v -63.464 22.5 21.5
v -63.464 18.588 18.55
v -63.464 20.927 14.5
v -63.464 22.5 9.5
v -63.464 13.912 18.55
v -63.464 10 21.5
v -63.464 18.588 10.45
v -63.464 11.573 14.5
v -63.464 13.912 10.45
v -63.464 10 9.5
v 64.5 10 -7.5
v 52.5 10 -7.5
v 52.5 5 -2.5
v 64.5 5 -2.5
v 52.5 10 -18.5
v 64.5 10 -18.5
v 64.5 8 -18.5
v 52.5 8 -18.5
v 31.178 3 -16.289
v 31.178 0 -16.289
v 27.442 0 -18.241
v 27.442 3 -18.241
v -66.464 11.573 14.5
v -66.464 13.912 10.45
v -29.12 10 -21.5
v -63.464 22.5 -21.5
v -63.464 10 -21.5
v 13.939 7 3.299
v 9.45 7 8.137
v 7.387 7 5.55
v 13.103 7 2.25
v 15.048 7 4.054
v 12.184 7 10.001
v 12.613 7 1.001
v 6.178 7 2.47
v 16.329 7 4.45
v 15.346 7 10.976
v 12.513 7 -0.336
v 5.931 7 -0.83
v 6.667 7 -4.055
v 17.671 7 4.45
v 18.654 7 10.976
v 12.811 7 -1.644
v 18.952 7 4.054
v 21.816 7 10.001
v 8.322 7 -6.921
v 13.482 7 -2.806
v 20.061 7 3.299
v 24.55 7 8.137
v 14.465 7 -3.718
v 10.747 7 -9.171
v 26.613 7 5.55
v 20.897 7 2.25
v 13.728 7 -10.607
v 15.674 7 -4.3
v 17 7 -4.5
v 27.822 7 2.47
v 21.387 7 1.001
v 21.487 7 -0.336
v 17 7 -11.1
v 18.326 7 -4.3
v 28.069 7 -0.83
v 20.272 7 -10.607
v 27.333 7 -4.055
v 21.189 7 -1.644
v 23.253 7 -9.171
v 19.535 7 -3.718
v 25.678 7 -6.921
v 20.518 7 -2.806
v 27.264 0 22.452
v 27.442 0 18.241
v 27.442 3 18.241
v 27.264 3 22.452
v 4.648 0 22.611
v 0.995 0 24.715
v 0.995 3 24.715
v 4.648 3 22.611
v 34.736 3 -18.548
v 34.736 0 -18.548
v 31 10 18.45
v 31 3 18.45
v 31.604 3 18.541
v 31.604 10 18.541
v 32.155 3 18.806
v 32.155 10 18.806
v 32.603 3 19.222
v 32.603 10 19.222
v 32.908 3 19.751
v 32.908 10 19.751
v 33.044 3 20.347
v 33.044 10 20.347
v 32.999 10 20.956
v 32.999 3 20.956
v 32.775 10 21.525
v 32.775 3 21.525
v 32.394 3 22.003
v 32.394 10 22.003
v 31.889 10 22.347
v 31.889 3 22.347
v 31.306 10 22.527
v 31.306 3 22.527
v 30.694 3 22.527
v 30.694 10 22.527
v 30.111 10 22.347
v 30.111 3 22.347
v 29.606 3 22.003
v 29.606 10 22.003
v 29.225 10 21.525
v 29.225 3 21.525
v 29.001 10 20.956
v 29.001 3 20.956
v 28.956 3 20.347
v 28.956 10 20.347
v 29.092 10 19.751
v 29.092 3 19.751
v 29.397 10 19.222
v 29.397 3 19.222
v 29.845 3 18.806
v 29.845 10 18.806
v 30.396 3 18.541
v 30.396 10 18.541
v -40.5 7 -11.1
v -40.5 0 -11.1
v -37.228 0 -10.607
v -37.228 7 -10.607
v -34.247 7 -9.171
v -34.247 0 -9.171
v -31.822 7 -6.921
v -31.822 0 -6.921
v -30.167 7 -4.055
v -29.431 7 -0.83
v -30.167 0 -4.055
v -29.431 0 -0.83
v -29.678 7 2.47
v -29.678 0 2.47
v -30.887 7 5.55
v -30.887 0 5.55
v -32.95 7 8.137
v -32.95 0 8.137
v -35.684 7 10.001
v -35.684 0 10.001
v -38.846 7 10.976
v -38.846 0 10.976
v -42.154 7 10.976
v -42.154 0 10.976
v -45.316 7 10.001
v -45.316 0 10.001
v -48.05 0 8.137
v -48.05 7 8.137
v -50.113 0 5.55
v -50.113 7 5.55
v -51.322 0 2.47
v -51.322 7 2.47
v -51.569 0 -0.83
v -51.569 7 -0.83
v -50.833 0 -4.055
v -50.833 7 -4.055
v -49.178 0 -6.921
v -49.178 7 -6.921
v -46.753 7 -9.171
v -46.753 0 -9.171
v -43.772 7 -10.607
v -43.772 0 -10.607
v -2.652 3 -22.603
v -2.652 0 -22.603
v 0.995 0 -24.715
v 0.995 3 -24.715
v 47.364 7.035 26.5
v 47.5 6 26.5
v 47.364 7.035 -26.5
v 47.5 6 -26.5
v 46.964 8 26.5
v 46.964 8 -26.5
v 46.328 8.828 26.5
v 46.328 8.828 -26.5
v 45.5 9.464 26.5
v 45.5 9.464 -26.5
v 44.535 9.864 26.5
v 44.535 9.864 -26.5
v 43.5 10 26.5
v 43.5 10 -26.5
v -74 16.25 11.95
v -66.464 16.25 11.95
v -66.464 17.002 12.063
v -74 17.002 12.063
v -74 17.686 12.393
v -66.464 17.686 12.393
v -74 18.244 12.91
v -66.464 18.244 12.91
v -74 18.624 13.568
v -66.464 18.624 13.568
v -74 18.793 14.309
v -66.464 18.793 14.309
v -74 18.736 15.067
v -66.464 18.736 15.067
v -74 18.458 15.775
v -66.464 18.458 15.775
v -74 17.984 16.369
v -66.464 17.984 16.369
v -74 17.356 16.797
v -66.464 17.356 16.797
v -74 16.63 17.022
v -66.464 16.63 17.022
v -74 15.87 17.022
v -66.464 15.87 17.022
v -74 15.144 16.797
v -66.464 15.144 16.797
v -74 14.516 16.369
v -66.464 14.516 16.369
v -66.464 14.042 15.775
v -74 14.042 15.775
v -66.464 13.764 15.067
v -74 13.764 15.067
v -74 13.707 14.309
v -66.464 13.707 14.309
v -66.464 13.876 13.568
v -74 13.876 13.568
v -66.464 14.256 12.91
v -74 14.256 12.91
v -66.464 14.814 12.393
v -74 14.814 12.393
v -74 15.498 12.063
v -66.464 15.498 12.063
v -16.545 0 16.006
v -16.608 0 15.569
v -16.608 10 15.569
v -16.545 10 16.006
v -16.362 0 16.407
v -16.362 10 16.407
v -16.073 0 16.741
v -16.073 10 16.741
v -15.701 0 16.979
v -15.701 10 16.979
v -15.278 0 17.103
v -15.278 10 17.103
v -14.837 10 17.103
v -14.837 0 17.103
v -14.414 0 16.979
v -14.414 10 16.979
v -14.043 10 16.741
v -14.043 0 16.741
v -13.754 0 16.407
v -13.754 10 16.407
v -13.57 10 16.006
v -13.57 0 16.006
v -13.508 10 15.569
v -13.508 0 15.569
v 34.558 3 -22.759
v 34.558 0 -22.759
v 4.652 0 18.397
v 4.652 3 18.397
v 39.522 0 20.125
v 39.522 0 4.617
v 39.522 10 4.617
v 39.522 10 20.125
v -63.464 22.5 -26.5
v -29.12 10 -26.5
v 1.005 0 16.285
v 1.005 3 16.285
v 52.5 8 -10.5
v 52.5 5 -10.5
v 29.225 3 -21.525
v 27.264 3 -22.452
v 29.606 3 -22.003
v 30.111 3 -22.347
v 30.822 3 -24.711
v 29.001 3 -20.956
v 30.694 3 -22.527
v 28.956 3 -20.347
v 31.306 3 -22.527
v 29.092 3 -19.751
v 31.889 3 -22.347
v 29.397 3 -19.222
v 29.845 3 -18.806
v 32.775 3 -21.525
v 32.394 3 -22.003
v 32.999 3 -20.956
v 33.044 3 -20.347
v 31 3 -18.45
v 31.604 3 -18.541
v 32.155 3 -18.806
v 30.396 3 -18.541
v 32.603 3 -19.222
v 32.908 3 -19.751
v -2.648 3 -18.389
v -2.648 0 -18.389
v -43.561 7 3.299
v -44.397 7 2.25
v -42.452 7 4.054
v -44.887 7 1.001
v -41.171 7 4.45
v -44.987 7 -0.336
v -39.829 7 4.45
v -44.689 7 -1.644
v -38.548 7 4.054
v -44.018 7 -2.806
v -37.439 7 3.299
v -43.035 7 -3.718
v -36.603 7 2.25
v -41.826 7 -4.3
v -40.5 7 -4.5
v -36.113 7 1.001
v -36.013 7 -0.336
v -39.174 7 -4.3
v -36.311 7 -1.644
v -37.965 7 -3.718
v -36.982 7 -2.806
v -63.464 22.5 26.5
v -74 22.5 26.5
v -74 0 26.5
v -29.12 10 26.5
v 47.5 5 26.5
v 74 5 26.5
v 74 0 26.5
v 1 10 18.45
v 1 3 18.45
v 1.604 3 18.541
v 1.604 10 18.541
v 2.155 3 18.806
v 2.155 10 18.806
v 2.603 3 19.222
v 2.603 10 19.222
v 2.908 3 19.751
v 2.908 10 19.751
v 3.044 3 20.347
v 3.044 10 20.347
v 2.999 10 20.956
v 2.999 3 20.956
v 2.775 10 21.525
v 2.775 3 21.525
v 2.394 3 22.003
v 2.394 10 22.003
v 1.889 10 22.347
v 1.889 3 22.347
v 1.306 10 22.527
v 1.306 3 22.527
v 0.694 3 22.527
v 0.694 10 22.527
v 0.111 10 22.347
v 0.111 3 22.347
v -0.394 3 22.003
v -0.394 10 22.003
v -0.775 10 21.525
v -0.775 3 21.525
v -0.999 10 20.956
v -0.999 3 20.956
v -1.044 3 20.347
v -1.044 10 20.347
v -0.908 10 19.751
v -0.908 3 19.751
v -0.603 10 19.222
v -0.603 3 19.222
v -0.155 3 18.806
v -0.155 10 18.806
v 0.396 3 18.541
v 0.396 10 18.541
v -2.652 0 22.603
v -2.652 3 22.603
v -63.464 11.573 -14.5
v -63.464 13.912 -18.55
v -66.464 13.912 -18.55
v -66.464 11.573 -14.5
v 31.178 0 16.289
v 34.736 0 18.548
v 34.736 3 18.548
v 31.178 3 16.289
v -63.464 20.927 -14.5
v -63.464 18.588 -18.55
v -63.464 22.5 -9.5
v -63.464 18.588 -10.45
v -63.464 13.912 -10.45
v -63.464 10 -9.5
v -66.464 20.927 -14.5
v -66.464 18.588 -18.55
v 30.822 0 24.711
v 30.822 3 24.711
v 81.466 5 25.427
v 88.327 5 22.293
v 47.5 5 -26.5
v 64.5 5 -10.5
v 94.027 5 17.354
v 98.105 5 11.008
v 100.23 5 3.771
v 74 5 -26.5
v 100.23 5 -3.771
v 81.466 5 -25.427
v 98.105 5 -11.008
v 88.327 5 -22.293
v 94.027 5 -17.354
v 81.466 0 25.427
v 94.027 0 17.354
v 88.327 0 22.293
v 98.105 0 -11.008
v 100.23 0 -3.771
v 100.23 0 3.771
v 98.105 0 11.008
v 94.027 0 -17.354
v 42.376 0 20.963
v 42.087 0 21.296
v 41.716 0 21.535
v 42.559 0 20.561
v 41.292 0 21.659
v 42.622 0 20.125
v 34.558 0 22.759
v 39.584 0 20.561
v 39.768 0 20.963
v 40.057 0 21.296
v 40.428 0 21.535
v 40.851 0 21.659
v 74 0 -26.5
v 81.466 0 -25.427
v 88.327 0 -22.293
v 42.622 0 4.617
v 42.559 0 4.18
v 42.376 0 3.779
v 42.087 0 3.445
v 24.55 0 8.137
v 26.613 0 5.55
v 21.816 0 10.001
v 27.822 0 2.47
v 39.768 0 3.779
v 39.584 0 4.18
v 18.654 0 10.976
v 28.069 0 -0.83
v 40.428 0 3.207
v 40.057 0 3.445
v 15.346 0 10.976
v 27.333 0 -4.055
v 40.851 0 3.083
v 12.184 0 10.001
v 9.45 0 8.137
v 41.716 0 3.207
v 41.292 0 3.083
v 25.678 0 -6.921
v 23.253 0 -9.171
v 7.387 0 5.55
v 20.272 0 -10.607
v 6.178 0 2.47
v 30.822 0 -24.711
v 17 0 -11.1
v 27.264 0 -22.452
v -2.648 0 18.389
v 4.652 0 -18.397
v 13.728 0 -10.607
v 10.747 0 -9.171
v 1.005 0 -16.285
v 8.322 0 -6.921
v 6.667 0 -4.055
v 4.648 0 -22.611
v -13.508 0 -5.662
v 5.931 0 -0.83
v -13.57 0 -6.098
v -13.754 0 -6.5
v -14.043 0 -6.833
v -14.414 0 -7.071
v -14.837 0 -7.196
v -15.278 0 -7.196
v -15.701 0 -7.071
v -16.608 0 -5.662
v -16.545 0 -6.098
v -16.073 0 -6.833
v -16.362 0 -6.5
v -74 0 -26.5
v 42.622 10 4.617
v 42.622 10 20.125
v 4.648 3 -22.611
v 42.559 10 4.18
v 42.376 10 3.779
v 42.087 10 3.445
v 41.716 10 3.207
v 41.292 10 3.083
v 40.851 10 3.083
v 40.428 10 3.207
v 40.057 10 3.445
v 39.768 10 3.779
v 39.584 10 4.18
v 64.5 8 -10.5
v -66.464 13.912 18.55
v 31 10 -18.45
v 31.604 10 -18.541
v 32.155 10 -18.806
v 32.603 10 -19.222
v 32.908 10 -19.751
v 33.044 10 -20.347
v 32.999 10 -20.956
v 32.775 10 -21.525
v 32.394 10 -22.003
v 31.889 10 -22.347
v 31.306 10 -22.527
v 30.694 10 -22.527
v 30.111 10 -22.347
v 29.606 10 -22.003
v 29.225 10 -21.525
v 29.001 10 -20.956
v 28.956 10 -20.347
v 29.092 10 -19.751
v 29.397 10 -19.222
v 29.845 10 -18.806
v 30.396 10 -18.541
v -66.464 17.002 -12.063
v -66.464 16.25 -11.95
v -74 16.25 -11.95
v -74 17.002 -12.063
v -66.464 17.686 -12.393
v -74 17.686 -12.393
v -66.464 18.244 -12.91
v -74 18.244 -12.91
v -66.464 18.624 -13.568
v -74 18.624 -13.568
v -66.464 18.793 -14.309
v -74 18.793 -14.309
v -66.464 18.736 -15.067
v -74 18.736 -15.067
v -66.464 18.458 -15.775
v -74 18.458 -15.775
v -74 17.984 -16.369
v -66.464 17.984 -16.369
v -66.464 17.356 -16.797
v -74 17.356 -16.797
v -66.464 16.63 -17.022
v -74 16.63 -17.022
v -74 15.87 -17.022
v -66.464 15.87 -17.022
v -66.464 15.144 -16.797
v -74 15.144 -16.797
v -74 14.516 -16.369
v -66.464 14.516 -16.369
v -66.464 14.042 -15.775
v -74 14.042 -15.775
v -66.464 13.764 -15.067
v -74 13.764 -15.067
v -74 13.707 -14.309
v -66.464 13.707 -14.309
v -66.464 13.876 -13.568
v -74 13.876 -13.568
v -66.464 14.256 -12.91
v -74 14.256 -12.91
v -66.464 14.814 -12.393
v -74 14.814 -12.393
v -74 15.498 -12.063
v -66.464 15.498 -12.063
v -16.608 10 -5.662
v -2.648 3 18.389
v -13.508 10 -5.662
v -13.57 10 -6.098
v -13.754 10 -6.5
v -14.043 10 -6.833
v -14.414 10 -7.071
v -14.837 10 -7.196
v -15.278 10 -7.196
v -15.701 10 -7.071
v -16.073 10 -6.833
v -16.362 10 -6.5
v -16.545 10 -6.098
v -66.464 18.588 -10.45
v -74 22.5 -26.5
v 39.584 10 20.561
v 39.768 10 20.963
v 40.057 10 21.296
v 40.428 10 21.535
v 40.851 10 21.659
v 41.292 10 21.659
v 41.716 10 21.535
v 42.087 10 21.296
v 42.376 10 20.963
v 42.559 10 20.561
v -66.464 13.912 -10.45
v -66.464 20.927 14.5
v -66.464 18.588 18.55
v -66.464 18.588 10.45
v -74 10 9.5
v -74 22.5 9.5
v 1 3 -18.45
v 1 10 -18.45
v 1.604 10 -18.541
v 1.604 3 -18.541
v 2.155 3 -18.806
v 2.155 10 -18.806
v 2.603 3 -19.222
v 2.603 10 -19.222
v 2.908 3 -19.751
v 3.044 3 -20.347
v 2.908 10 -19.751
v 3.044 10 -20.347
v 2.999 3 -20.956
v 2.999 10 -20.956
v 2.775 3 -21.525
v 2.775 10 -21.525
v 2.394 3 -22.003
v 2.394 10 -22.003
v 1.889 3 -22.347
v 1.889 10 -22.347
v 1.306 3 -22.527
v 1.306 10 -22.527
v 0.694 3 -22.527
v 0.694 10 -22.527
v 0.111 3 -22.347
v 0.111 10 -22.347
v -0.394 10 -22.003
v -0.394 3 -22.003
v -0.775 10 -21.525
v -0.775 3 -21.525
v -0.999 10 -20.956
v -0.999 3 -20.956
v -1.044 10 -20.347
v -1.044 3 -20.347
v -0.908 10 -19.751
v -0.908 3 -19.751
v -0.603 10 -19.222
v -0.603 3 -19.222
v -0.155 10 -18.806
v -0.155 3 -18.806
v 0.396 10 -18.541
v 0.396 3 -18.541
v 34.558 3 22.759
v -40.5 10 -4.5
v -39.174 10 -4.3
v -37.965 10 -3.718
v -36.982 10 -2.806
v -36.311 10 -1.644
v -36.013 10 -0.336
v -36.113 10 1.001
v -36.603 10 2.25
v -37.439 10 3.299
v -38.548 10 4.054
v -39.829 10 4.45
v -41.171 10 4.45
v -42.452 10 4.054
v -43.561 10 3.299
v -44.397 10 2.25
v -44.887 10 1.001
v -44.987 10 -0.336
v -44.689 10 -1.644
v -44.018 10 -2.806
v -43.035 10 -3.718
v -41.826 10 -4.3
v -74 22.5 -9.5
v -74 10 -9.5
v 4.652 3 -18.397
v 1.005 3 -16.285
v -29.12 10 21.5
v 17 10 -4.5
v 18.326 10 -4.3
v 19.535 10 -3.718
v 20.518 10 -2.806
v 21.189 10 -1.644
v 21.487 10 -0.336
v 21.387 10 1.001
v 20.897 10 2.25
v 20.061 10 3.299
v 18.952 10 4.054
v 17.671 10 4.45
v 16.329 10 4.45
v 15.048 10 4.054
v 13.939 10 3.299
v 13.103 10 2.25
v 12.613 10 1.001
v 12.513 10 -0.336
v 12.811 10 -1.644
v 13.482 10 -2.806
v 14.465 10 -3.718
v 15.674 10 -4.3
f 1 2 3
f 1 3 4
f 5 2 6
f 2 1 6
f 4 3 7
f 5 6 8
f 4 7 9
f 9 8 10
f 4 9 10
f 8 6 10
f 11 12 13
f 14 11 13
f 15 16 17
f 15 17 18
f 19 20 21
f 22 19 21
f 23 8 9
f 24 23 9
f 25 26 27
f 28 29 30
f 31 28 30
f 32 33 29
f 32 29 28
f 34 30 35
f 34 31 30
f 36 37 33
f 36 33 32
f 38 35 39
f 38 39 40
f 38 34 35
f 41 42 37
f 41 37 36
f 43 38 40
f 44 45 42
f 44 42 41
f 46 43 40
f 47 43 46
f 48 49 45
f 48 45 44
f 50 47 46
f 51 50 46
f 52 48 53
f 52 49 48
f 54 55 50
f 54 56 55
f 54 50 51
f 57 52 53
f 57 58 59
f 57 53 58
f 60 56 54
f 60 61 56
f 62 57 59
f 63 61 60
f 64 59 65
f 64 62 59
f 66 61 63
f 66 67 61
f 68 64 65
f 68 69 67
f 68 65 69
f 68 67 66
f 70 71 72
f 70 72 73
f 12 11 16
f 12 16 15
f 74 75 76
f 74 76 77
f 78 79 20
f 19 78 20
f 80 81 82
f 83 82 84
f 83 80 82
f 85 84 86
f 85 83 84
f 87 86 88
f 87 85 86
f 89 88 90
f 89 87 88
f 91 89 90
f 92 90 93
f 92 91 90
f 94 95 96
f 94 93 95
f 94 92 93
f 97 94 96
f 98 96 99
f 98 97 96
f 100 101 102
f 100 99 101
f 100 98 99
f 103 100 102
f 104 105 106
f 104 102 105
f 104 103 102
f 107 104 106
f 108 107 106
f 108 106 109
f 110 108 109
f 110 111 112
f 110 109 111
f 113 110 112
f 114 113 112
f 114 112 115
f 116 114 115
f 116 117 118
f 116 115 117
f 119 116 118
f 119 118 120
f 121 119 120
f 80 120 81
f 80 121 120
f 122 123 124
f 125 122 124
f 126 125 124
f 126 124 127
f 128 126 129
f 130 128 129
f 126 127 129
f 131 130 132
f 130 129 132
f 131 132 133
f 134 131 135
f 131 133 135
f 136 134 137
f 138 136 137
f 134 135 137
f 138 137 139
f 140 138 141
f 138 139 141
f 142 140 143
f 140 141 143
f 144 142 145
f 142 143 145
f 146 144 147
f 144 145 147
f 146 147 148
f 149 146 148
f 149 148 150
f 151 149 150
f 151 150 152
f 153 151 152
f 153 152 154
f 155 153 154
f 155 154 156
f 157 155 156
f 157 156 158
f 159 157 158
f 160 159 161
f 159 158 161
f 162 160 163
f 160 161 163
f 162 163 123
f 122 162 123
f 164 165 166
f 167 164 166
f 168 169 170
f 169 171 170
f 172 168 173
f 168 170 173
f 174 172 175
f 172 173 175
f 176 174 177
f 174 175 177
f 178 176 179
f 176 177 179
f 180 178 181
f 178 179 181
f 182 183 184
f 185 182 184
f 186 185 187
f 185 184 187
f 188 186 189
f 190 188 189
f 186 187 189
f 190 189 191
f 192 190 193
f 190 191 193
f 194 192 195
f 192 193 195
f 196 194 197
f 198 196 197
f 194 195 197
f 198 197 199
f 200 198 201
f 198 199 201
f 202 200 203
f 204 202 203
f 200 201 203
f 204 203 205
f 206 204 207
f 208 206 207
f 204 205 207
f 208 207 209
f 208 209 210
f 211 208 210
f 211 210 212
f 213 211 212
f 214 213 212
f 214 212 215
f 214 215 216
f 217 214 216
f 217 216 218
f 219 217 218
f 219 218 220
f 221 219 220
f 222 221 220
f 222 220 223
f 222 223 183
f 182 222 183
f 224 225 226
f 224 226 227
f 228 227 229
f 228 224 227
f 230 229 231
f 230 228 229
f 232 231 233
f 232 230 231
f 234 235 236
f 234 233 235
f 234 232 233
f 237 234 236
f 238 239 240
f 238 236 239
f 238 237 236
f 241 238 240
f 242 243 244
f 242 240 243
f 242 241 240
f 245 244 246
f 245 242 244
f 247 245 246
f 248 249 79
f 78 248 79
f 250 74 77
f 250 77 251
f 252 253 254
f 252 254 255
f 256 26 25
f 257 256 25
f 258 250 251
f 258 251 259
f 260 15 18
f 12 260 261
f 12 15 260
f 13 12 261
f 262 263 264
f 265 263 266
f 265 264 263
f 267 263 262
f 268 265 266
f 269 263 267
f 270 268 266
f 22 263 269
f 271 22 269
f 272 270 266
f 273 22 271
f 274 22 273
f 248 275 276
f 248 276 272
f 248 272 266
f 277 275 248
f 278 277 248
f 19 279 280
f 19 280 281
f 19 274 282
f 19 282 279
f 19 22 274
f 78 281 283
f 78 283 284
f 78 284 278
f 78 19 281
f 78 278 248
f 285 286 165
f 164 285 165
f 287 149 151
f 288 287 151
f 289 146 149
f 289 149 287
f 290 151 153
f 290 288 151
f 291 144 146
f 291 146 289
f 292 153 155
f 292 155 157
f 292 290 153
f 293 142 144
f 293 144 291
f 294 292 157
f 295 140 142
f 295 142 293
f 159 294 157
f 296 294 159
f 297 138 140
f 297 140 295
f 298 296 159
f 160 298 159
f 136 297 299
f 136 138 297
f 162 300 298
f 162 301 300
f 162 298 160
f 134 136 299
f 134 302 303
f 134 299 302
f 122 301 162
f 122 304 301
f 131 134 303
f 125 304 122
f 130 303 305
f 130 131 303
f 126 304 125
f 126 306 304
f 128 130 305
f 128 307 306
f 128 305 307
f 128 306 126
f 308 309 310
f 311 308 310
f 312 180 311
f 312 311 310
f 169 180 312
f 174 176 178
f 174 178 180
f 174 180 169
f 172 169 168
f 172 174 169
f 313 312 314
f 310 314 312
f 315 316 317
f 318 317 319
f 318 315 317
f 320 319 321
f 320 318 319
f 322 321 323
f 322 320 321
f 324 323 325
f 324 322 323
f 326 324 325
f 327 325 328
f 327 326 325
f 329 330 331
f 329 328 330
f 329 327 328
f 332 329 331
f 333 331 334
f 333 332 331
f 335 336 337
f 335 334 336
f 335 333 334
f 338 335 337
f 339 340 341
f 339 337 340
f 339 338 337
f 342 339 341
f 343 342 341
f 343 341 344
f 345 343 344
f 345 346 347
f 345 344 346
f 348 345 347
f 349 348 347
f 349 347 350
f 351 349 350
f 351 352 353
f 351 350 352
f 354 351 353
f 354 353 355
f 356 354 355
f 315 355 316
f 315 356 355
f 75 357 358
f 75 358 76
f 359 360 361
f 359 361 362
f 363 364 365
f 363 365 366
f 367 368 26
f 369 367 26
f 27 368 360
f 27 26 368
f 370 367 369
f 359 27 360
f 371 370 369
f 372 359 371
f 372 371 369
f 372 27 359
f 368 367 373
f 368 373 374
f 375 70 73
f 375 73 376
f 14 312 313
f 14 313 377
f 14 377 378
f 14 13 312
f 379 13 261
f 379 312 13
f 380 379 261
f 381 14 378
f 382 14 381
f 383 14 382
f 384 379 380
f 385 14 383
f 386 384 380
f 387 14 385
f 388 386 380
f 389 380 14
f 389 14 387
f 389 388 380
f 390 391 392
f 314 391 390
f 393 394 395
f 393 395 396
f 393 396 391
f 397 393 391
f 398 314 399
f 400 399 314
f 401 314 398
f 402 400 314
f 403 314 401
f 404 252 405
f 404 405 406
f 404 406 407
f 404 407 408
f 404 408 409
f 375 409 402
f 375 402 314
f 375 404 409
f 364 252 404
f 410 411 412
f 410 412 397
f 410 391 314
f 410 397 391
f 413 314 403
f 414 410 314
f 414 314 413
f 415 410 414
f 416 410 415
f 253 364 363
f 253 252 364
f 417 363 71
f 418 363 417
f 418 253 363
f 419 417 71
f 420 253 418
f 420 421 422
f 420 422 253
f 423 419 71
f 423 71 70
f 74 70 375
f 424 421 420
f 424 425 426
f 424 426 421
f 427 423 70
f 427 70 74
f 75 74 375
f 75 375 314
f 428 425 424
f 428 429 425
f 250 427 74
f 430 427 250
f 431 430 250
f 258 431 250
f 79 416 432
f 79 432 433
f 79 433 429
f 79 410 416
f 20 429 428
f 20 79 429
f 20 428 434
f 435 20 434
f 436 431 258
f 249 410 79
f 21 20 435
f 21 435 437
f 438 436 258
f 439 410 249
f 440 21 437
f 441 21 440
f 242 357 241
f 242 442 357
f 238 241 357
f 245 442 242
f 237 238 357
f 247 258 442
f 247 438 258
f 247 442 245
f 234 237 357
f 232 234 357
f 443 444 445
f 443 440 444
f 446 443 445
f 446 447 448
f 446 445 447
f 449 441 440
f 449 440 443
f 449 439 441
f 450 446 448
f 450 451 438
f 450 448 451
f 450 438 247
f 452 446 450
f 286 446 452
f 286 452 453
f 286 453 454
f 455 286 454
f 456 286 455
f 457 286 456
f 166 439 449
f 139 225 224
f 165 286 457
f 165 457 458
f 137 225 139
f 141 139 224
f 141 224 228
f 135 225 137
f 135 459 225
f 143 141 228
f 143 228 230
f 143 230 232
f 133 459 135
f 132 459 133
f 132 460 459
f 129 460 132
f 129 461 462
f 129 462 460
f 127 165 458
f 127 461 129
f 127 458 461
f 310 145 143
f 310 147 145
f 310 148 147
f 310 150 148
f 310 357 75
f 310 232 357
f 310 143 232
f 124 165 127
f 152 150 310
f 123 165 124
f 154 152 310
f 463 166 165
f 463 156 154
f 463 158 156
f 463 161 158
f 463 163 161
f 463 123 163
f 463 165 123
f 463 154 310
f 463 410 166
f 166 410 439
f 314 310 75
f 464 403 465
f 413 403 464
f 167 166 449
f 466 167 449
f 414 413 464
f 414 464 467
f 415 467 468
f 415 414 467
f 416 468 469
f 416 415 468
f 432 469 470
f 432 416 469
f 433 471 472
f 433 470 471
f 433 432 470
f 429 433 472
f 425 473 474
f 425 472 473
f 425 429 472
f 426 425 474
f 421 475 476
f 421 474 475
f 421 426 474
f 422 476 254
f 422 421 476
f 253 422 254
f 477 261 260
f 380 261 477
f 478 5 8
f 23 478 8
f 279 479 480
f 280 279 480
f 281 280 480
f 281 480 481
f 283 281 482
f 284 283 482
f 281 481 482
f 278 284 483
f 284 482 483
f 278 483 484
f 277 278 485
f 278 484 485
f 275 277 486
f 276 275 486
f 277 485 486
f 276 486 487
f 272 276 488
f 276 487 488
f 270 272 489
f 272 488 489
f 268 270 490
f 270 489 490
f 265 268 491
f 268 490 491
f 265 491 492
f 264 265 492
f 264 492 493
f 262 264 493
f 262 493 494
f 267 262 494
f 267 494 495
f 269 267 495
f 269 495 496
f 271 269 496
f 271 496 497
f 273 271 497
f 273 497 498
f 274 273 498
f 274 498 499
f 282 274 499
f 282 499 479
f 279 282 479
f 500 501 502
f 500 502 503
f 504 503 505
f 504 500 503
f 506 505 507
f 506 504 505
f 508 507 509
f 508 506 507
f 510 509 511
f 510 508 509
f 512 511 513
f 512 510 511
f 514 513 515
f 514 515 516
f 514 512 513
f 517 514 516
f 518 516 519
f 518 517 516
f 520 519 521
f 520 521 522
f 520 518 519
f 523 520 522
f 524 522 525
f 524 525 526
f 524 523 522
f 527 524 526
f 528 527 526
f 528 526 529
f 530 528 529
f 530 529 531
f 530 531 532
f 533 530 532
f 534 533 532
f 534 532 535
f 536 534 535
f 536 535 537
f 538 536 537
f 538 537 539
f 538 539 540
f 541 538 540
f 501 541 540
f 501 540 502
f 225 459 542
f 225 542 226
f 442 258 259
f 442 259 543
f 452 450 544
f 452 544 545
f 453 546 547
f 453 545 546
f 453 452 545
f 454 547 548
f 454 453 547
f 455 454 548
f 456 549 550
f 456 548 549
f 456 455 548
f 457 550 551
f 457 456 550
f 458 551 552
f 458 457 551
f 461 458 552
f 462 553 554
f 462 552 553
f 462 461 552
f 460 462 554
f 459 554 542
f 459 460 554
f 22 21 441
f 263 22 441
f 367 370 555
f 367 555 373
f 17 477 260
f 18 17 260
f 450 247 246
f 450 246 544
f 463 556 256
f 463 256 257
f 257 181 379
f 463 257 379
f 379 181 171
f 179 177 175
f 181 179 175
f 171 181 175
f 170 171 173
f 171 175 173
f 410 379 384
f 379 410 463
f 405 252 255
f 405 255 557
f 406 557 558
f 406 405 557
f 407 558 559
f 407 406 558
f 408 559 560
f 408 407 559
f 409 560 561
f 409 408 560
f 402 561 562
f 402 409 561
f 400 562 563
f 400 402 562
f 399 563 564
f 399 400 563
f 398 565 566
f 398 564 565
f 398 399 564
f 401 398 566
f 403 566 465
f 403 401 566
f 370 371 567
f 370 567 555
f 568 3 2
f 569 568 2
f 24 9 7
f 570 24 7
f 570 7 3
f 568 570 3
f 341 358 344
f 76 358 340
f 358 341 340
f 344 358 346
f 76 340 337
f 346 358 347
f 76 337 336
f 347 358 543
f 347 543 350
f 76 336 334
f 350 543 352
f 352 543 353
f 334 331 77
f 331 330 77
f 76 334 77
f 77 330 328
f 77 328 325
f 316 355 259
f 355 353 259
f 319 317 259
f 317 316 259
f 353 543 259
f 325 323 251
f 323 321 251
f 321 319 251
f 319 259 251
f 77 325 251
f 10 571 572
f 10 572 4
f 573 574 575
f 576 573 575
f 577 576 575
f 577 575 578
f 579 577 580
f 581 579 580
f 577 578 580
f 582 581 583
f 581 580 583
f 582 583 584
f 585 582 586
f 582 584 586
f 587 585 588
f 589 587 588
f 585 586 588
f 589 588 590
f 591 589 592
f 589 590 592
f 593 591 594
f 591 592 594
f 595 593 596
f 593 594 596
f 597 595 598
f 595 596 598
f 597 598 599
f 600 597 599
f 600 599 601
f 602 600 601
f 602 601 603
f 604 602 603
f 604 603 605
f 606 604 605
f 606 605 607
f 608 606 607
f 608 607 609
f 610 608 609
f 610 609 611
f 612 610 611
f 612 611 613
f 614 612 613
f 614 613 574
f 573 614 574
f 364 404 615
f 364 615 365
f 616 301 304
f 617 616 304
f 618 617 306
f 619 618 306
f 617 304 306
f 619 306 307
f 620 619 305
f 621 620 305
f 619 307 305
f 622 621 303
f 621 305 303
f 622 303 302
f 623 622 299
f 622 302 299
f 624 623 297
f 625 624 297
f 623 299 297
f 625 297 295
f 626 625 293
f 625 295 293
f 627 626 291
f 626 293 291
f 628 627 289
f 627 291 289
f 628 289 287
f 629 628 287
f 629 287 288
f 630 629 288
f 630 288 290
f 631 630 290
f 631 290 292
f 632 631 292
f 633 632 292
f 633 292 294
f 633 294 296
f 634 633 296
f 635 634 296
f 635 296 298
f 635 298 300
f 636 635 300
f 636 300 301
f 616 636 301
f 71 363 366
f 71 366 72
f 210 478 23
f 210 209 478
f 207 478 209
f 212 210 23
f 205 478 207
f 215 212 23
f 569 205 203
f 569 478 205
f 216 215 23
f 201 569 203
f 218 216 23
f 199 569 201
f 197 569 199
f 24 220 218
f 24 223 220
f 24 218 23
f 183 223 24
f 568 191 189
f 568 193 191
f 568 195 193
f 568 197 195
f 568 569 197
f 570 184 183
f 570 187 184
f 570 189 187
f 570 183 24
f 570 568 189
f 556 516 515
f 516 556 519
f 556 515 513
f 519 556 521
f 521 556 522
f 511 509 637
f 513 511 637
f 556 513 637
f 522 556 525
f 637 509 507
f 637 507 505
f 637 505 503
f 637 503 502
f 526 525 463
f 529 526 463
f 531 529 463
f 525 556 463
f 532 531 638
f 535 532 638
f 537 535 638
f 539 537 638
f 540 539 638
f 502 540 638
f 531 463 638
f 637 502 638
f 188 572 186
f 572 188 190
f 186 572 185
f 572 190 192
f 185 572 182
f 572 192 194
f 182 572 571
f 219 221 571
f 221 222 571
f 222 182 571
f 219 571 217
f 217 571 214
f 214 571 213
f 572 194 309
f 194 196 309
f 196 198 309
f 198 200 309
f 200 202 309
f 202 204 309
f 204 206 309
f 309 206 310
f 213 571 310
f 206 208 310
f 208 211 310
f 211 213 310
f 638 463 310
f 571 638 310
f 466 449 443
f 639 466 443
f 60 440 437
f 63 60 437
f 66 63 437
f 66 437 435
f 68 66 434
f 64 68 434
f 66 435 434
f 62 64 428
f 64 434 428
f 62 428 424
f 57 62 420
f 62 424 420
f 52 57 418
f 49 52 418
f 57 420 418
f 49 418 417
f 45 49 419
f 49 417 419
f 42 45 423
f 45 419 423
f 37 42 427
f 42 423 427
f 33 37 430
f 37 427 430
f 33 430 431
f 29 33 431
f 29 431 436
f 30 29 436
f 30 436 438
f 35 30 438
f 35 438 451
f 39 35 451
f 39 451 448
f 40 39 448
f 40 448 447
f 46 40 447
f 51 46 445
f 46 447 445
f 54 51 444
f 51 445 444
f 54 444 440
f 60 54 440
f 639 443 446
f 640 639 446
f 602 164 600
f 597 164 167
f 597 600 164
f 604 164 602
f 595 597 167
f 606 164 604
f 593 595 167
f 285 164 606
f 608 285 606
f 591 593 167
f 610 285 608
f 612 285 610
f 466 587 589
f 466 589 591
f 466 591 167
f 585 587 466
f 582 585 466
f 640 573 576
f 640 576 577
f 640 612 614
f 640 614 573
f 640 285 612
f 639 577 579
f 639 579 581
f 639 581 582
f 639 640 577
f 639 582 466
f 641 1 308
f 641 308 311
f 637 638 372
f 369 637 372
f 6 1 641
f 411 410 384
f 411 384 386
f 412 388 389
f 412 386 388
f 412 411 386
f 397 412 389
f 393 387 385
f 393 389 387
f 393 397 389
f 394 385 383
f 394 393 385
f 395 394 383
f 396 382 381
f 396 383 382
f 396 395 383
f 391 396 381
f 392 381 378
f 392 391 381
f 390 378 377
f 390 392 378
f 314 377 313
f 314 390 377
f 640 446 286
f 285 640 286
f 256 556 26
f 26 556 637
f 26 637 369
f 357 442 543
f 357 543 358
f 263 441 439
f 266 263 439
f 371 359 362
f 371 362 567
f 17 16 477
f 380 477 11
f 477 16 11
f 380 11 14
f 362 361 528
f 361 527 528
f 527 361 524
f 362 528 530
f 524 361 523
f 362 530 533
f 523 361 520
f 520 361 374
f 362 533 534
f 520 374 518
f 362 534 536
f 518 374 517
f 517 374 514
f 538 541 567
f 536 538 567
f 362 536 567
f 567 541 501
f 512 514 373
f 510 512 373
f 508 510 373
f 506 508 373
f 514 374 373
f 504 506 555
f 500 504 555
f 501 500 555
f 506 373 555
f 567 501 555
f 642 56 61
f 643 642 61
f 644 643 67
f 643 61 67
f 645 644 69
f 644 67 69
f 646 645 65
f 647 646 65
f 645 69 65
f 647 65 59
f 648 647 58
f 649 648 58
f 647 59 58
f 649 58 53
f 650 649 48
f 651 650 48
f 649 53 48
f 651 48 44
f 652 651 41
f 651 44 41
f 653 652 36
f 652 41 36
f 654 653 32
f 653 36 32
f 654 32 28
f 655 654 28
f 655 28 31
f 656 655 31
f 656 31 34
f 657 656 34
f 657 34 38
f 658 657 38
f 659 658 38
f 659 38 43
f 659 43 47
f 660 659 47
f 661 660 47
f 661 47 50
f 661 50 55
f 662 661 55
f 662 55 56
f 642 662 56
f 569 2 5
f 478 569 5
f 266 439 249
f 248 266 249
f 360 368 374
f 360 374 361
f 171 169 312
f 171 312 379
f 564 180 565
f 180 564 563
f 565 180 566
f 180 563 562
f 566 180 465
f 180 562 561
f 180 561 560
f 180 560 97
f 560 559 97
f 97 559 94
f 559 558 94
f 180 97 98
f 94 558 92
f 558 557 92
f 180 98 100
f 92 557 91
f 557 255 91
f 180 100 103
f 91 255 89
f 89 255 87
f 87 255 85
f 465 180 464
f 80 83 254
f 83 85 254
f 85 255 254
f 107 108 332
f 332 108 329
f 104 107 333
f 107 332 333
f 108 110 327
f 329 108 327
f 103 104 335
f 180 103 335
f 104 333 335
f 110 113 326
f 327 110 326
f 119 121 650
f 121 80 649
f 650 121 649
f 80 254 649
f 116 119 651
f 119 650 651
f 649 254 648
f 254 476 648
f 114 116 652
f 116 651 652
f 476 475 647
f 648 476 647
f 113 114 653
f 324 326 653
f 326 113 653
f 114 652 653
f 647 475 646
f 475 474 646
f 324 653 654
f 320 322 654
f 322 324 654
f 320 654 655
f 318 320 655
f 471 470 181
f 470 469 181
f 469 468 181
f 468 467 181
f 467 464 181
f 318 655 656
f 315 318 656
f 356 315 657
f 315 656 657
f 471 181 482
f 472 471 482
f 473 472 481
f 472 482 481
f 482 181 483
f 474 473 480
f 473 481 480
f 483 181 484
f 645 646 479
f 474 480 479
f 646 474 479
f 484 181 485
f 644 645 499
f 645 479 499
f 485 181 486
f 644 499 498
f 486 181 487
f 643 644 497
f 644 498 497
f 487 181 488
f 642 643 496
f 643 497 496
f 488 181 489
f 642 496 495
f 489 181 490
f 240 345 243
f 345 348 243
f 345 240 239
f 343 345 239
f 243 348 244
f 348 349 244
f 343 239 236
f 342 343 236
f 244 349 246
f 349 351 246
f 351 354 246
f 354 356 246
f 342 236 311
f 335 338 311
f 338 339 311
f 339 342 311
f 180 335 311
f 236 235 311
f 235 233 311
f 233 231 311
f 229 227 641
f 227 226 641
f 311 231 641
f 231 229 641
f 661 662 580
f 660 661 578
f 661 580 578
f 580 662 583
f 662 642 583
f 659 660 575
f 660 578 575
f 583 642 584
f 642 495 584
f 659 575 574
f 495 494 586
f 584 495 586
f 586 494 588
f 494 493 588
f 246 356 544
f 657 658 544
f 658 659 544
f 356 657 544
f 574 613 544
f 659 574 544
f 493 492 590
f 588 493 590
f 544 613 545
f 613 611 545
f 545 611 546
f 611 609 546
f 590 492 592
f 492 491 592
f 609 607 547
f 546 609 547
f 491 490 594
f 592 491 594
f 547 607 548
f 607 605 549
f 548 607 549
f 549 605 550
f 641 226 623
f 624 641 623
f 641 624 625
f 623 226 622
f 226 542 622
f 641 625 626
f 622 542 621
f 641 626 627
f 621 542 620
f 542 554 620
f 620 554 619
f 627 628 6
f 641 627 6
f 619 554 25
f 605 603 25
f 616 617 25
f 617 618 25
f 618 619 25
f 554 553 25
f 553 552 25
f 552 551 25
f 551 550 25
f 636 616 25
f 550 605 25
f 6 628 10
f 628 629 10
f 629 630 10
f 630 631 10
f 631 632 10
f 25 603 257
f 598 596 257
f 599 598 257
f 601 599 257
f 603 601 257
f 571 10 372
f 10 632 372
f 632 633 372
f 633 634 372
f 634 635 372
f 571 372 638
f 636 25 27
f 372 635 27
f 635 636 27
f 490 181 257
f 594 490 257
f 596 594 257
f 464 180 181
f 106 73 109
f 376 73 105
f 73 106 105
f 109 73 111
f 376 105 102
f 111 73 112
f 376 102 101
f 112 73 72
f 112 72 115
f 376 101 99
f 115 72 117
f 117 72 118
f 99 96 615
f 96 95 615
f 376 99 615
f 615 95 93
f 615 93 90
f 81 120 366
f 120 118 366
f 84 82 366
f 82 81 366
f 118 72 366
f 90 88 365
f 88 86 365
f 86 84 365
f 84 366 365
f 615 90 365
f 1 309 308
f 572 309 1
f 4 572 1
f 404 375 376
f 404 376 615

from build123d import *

# Parameters (mm, degrees)
BOSS_EXTRUDE1_DEPTH = 10
SKETCH2_W           = 10.53641682
SKETCH2_H           = 17
BOSS_EXTRUDE2_DEPTH = 12.5
RIB1_REACH          = 117.825
SKETCH3_WALL_W      = 270.198153966
SKETCH3_WALL_H      = 5
CUT_EXTRUDE1_REACH  = 169.608
SKETCH4_R           = 2.55
CUT_EXTRUDE2_DEPTH  = 3
SKETCH6_R           = 11.1
CUT_EXTRUDE3_DEPTH  = 7
CUT_EXTRUDE5_REACH  = 107.084
SKETCH8_R           = 4.5
SKETCH9_R           = 11.1
CUT_EXTRUDE6_DEPTH  = 7
CUT_EXTRUDE7_REACH  = 107.084
SKETCH10_R          = 4.5
SKETCH12_R          = 2.05
CUT_EXTRUDE9_DEPTH  = 105.684048451
CUT_EXTRUDE10_DEPTH = 3
CUT_EXTRUDE11_REACH = 108.343
CUT_EXTRUDE12_REACH = 108.343
SKETCH16_W          = 53
SKETCH16_H          = 93.98301549
CUT_EXTRUDE13_DEPTH = 5
FILLET3_R           = 4
SKETCH17_W          = 12
SKETCH17_H          = 3
BOSS_EXTRUDE3_DEPTH = 5
SKETCH18_W          = 12
SKETCH18_H          = 2
BOSS_EXTRUDE4_DEPTH = 8
RIB2_REACH          = 144.796
SKETCH19_WALL_W     = 294.663434656
SKETCH19_WALL_H     = 12


with BuildPart() as part:
    # Sketch1 → Boss-Extrude1 (new body)
    with BuildSketch(Plane(origin=(0, 0, 0), x_dir=(1, 0, 0), z_dir=(0, 1, 0))):
        with BuildLine():
            Line((-74, 26.5), (74, 26.5))
            ThreePointArc((74, 26.5), (100.5, 0), (74, -26.5))
            Line((74, -26.5), (-74, -26.5))
            Line((-74, -26.5), (-74, 26.5))
        make_face()
    extrude(amount=BOSS_EXTRUDE1_DEPTH)

    # Sketch2 → Boss-Extrude2 (add)
    with BuildSketch(Plane(origin=(0, 10, 0), x_dir=(1, 0, 0), z_dir=(0, 1, 0))):
        with Locations((-68.73179159, -18)):
            Rectangle(SKETCH2_W, SKETCH2_H)
    boss_extrude2 = extrude(amount=BOSS_EXTRUDE2_DEPTH)

    # Sketch3 wall → Rib1 (add, up to next)
    with BuildSketch(Plane(origin=(-46.291849308, 16.25, 26.5), x_dir=(0.939692620789, -0.342020143318, 0), z_dir=(0.342020143318, 0.939692620789, 0)), mode=Mode.PRIVATE) as rib1_sk1:
        with Locations((0, 2.5)):
            Rectangle(SKETCH3_WALL_W, SKETCH3_WALL_H)
    rib1_tool1 = extrude(rib1_sk1.sketch, amount=-RIB1_REACH, mode=Mode.PRIVATE) - part.part
    rib1 = rib1_tool1.solids().sort_by_distance((-46.291849308, 16.25, 26.5))[0]
    add(rib1)

    # Sketch4 → Cut-Extrude1 (cut, up to next)
    with BuildSketch(Plane(origin=(-63.46358318, 0, 0), x_dir=(0, 0, -1), z_dir=(1, 0, 0)), mode=Mode.PRIVATE) as cut_extrude1_sk1:
        with Locations((-14.5, 16.25)):
            Circle(SKETCH4_R)
    cut_extrude1_tool1 = extrude(cut_extrude1_sk1.sketch, amount=-CUT_EXTRUDE1_REACH, mode=Mode.PRIVATE) & part.part
    cut_extrude1 = cut_extrude1_tool1.solids().sort_by_distance((-63.463583, 16.25, 14.5))[0]
    add(cut_extrude1, mode=Mode.SUBTRACT)

    # Sketch5 → Cut-Extrude2 (cut)
    with BuildSketch(Plane(origin=(-63.46358318, 0, 0), x_dir=(0, 0, -1), z_dir=(1, 0, 0))):
        Polygon((-10.45, 13.91173141), (-10.45, 18.58826859), (-14.5, 20.92653718), (-18.55, 18.58826859), (-18.55, 13.91173141), (-14.5, 11.57346282), align=None)
    cut_extrude2 = extrude(amount=-CUT_EXTRUDE2_DEPTH, mode=Mode.SUBTRACT)

    # Mirror1: Boss-Extrude2, Rib1, Cut-Extrude1, Cut-Extrude2 across plane
    add(boss_extrude2.mirror(Plane.XY))
    add(rib1.mirror(Plane.XY))
    add(cut_extrude1.mirror(Plane.XY), mode=Mode.SUBTRACT)
    add(cut_extrude2.mirror(Plane.XY), mode=Mode.SUBTRACT)

    # Sketch6 → Cut-Extrude3 (cut)
    with BuildSketch(Plane.XZ):
        with Locations(Location((-40.5, 0, 0), (0, 0, 270))):
            Circle(SKETCH6_R)
    extrude(amount=-CUT_EXTRUDE3_DEPTH, mode=Mode.SUBTRACT)

    # Sketch8 → Cut-Extrude5 (cut, up to next)
    with BuildSketch(Plane.XZ.offset(-7), mode=Mode.PRIVATE) as cut_extrude5_sk1:
        with Locations(Location((-40.5, 0, 0), (0, 0, 270))):
            Circle(SKETCH8_R)
    cut_extrude5_tool1 = extrude(cut_extrude5_sk1.sketch, amount=-CUT_EXTRUDE5_REACH, mode=Mode.PRIVATE) & part.part
    add(cut_extrude5_tool1.solids().sort_by_distance((-40.5, 7, 0))[0], mode=Mode.SUBTRACT)

    # Sketch9 → Cut-Extrude6 (cut)
    with BuildSketch(Plane.XZ):
        with Locations(Location((17, 0, 0), (0, 0, 270))):
            Circle(SKETCH9_R)
    extrude(amount=-CUT_EXTRUDE6_DEPTH, mode=Mode.SUBTRACT)

    # Sketch10 → Cut-Extrude7 (cut, up to next)
    with BuildSketch(Plane.XZ.offset(-7), mode=Mode.PRIVATE) as cut_extrude7_sk1:
        with Locations(Location((17, 0, 0), (0, 0, 270))):
            Circle(SKETCH10_R)
    cut_extrude7_tool1 = extrude(cut_extrude7_sk1.sketch, amount=-CUT_EXTRUDE7_REACH, mode=Mode.PRIVATE) & part.part
    add(cut_extrude7_tool1.solids().sort_by_distance((17, 7, 0))[0], mode=Mode.SUBTRACT)

    # Sketch12 → Cut-Extrude9 (cut, through all)
    with BuildSketch(Plane(origin=(0, 10, 0), x_dir=(1, 0, 0), z_dir=(0, 1, 0))):
        with Locations(Location((1, 20.5, 0), (0, 0, 270))):
            Circle(SKETCH12_R)
        with Locations(Location((31, 20.5, 0), (0, 0, 270))):
            Circle(SKETCH12_R)
    cut_extrude9 = extrude(amount=-CUT_EXTRUDE9_DEPTH, mode=Mode.SUBTRACT)

    # Sketch13 → Cut-Extrude10 (cut)
    with BuildSketch(Plane.XZ):
        Polygon((4.64766982, -22.61135933), (4.652325726, -18.396704937), (1.004655907, -16.285345607), (-2.64766982, -18.38864067), (-2.652325726, -22.603295063), (0.995344093, -24.714654393), align=None)
        Polygon((34.557933518, -22.759301311), (34.735579089, -18.548389844), (31.177645571, -16.289088533), (27.442066482, -18.240698689), (27.264420911, -22.451610156), (30.822354429, -24.710911467), align=None)
    cut_extrude10 = extrude(amount=-CUT_EXTRUDE10_DEPTH, mode=Mode.SUBTRACT)

    # Mirror2: Cut-Extrude9, Cut-Extrude10 across plane
    add(cut_extrude9.mirror(Plane.XY), mode=Mode.SUBTRACT)
    add(cut_extrude10.mirror(Plane.XY), mode=Mode.SUBTRACT)

    # Sketch14 → Cut-Extrude11 (cut, up to next)
    with BuildSketch(Plane.XZ, mode=Mode.PRIVATE) as cut_extrude11_sk1:
        with BuildLine():
            Line((-13.507595269, 15.569177398), (-13.507595269, -5.661519054))
            ThreePointArc((-13.507595269, -5.661519054), (-15.057595269, -7.211519054), (-16.607595269, -5.661519054))
            Line((-16.607595269, -5.661519054), (-16.607595269, 15.569177398))
            ThreePointArc((-16.607595269, 15.569177398), (-15.057595269, 17.119177398), (-13.507595269, 15.569177398))
        make_face()
    cut_extrude11_tool1 = extrude(cut_extrude11_sk1.sketch, amount=-CUT_EXTRUDE11_REACH, mode=Mode.PRIVATE) & part.part
    add(cut_extrude11_tool1.solids().sort_by_distance((-15.057595, 0, 4.953829))[0], mode=Mode.SUBTRACT)

    # Sketch15 → Cut-Extrude12 (cut, up to next)
    with BuildSketch(Plane.XZ, mode=Mode.PRIVATE) as cut_extrude12_sk1:
        with BuildLine():
            Line((42.621659424, 20.124694382), (42.621659424, 4.616853199))
            ThreePointArc((42.621659424, 4.616853199), (41.071659424, 3.066853199), (39.521659424, 4.616853199))
            Line((39.521659424, 4.616853199), (39.521659424, 20.124694382))
            ThreePointArc((39.521659424, 20.124694382), (41.071659424, 21.674694382), (42.621659424, 20.124694382))
        make_face()
    cut_extrude12_tool1 = extrude(cut_extrude12_sk1.sketch, amount=-CUT_EXTRUDE12_REACH, mode=Mode.PRIVATE) & part.part
    add(cut_extrude12_tool1.solids().sort_by_distance((41.071659, 0, 12.370774))[0], mode=Mode.SUBTRACT)

    # Sketch16 → Cut-Extrude13 (cut)
    with BuildSketch(Plane(origin=(0, 10, 0), x_dir=(1, 0, 0), z_dir=(0, 1, 0))):
        with Locations((74, 0)):
            Rectangle(SKETCH16_W, SKETCH16_H)
    extrude(amount=-CUT_EXTRUDE13_DEPTH, mode=Mode.SUBTRACT)

    # Fillet3
    fillet3_edges = [part.edges().sort_by_distance(p)[0] for p in [
        (47.5, 10, 0),
    ]]
    fillet(fillet3_edges, radius=FILLET3_R)

    # Sketch17 → Boss-Extrude3 (add)
    with BuildSketch(Plane(origin=(0, 5, 0), x_dir=(1, 0, 0), z_dir=(0, 1, 0))):
        with Locations((58.5, 9)):
            Rectangle(SKETCH17_W, SKETCH17_H)
    extrude(amount=BOSS_EXTRUDE3_DEPTH)

    # Sketch18 → Boss-Extrude4 (add)
    with BuildSketch(Plane(origin=(0, 0, -10.5), x_dir=(-1, 0, 0), z_dir=(0, 0, -1))):
        with Locations((-58.5, 9)):
            Rectangle(SKETCH18_W, SKETCH18_H)
    extrude(amount=BOSS_EXTRUDE4_DEPTH)

    # Sketch19 wall → Rib2 (add, up to next)
    with BuildSketch(Plane(origin=(64.5, 7.5, -5), x_dir=(0, -0.707106781187, 0.707106781187), z_dir=(0, -0.707106781187, -0.707106781187)), mode=Mode.PRIVATE) as rib2_sk1:
        with Locations((0, 6)):
            Rectangle(SKETCH19_WALL_W, SKETCH19_WALL_H)
    rib2_tool1 = extrude(rib2_sk1.sketch, amount=RIB2_REACH, mode=Mode.PRIVATE) - part.part
    add(rib2_tool1.solids().sort_by_distance((64.5, 7.5, -5))[0])


solid = part.part
